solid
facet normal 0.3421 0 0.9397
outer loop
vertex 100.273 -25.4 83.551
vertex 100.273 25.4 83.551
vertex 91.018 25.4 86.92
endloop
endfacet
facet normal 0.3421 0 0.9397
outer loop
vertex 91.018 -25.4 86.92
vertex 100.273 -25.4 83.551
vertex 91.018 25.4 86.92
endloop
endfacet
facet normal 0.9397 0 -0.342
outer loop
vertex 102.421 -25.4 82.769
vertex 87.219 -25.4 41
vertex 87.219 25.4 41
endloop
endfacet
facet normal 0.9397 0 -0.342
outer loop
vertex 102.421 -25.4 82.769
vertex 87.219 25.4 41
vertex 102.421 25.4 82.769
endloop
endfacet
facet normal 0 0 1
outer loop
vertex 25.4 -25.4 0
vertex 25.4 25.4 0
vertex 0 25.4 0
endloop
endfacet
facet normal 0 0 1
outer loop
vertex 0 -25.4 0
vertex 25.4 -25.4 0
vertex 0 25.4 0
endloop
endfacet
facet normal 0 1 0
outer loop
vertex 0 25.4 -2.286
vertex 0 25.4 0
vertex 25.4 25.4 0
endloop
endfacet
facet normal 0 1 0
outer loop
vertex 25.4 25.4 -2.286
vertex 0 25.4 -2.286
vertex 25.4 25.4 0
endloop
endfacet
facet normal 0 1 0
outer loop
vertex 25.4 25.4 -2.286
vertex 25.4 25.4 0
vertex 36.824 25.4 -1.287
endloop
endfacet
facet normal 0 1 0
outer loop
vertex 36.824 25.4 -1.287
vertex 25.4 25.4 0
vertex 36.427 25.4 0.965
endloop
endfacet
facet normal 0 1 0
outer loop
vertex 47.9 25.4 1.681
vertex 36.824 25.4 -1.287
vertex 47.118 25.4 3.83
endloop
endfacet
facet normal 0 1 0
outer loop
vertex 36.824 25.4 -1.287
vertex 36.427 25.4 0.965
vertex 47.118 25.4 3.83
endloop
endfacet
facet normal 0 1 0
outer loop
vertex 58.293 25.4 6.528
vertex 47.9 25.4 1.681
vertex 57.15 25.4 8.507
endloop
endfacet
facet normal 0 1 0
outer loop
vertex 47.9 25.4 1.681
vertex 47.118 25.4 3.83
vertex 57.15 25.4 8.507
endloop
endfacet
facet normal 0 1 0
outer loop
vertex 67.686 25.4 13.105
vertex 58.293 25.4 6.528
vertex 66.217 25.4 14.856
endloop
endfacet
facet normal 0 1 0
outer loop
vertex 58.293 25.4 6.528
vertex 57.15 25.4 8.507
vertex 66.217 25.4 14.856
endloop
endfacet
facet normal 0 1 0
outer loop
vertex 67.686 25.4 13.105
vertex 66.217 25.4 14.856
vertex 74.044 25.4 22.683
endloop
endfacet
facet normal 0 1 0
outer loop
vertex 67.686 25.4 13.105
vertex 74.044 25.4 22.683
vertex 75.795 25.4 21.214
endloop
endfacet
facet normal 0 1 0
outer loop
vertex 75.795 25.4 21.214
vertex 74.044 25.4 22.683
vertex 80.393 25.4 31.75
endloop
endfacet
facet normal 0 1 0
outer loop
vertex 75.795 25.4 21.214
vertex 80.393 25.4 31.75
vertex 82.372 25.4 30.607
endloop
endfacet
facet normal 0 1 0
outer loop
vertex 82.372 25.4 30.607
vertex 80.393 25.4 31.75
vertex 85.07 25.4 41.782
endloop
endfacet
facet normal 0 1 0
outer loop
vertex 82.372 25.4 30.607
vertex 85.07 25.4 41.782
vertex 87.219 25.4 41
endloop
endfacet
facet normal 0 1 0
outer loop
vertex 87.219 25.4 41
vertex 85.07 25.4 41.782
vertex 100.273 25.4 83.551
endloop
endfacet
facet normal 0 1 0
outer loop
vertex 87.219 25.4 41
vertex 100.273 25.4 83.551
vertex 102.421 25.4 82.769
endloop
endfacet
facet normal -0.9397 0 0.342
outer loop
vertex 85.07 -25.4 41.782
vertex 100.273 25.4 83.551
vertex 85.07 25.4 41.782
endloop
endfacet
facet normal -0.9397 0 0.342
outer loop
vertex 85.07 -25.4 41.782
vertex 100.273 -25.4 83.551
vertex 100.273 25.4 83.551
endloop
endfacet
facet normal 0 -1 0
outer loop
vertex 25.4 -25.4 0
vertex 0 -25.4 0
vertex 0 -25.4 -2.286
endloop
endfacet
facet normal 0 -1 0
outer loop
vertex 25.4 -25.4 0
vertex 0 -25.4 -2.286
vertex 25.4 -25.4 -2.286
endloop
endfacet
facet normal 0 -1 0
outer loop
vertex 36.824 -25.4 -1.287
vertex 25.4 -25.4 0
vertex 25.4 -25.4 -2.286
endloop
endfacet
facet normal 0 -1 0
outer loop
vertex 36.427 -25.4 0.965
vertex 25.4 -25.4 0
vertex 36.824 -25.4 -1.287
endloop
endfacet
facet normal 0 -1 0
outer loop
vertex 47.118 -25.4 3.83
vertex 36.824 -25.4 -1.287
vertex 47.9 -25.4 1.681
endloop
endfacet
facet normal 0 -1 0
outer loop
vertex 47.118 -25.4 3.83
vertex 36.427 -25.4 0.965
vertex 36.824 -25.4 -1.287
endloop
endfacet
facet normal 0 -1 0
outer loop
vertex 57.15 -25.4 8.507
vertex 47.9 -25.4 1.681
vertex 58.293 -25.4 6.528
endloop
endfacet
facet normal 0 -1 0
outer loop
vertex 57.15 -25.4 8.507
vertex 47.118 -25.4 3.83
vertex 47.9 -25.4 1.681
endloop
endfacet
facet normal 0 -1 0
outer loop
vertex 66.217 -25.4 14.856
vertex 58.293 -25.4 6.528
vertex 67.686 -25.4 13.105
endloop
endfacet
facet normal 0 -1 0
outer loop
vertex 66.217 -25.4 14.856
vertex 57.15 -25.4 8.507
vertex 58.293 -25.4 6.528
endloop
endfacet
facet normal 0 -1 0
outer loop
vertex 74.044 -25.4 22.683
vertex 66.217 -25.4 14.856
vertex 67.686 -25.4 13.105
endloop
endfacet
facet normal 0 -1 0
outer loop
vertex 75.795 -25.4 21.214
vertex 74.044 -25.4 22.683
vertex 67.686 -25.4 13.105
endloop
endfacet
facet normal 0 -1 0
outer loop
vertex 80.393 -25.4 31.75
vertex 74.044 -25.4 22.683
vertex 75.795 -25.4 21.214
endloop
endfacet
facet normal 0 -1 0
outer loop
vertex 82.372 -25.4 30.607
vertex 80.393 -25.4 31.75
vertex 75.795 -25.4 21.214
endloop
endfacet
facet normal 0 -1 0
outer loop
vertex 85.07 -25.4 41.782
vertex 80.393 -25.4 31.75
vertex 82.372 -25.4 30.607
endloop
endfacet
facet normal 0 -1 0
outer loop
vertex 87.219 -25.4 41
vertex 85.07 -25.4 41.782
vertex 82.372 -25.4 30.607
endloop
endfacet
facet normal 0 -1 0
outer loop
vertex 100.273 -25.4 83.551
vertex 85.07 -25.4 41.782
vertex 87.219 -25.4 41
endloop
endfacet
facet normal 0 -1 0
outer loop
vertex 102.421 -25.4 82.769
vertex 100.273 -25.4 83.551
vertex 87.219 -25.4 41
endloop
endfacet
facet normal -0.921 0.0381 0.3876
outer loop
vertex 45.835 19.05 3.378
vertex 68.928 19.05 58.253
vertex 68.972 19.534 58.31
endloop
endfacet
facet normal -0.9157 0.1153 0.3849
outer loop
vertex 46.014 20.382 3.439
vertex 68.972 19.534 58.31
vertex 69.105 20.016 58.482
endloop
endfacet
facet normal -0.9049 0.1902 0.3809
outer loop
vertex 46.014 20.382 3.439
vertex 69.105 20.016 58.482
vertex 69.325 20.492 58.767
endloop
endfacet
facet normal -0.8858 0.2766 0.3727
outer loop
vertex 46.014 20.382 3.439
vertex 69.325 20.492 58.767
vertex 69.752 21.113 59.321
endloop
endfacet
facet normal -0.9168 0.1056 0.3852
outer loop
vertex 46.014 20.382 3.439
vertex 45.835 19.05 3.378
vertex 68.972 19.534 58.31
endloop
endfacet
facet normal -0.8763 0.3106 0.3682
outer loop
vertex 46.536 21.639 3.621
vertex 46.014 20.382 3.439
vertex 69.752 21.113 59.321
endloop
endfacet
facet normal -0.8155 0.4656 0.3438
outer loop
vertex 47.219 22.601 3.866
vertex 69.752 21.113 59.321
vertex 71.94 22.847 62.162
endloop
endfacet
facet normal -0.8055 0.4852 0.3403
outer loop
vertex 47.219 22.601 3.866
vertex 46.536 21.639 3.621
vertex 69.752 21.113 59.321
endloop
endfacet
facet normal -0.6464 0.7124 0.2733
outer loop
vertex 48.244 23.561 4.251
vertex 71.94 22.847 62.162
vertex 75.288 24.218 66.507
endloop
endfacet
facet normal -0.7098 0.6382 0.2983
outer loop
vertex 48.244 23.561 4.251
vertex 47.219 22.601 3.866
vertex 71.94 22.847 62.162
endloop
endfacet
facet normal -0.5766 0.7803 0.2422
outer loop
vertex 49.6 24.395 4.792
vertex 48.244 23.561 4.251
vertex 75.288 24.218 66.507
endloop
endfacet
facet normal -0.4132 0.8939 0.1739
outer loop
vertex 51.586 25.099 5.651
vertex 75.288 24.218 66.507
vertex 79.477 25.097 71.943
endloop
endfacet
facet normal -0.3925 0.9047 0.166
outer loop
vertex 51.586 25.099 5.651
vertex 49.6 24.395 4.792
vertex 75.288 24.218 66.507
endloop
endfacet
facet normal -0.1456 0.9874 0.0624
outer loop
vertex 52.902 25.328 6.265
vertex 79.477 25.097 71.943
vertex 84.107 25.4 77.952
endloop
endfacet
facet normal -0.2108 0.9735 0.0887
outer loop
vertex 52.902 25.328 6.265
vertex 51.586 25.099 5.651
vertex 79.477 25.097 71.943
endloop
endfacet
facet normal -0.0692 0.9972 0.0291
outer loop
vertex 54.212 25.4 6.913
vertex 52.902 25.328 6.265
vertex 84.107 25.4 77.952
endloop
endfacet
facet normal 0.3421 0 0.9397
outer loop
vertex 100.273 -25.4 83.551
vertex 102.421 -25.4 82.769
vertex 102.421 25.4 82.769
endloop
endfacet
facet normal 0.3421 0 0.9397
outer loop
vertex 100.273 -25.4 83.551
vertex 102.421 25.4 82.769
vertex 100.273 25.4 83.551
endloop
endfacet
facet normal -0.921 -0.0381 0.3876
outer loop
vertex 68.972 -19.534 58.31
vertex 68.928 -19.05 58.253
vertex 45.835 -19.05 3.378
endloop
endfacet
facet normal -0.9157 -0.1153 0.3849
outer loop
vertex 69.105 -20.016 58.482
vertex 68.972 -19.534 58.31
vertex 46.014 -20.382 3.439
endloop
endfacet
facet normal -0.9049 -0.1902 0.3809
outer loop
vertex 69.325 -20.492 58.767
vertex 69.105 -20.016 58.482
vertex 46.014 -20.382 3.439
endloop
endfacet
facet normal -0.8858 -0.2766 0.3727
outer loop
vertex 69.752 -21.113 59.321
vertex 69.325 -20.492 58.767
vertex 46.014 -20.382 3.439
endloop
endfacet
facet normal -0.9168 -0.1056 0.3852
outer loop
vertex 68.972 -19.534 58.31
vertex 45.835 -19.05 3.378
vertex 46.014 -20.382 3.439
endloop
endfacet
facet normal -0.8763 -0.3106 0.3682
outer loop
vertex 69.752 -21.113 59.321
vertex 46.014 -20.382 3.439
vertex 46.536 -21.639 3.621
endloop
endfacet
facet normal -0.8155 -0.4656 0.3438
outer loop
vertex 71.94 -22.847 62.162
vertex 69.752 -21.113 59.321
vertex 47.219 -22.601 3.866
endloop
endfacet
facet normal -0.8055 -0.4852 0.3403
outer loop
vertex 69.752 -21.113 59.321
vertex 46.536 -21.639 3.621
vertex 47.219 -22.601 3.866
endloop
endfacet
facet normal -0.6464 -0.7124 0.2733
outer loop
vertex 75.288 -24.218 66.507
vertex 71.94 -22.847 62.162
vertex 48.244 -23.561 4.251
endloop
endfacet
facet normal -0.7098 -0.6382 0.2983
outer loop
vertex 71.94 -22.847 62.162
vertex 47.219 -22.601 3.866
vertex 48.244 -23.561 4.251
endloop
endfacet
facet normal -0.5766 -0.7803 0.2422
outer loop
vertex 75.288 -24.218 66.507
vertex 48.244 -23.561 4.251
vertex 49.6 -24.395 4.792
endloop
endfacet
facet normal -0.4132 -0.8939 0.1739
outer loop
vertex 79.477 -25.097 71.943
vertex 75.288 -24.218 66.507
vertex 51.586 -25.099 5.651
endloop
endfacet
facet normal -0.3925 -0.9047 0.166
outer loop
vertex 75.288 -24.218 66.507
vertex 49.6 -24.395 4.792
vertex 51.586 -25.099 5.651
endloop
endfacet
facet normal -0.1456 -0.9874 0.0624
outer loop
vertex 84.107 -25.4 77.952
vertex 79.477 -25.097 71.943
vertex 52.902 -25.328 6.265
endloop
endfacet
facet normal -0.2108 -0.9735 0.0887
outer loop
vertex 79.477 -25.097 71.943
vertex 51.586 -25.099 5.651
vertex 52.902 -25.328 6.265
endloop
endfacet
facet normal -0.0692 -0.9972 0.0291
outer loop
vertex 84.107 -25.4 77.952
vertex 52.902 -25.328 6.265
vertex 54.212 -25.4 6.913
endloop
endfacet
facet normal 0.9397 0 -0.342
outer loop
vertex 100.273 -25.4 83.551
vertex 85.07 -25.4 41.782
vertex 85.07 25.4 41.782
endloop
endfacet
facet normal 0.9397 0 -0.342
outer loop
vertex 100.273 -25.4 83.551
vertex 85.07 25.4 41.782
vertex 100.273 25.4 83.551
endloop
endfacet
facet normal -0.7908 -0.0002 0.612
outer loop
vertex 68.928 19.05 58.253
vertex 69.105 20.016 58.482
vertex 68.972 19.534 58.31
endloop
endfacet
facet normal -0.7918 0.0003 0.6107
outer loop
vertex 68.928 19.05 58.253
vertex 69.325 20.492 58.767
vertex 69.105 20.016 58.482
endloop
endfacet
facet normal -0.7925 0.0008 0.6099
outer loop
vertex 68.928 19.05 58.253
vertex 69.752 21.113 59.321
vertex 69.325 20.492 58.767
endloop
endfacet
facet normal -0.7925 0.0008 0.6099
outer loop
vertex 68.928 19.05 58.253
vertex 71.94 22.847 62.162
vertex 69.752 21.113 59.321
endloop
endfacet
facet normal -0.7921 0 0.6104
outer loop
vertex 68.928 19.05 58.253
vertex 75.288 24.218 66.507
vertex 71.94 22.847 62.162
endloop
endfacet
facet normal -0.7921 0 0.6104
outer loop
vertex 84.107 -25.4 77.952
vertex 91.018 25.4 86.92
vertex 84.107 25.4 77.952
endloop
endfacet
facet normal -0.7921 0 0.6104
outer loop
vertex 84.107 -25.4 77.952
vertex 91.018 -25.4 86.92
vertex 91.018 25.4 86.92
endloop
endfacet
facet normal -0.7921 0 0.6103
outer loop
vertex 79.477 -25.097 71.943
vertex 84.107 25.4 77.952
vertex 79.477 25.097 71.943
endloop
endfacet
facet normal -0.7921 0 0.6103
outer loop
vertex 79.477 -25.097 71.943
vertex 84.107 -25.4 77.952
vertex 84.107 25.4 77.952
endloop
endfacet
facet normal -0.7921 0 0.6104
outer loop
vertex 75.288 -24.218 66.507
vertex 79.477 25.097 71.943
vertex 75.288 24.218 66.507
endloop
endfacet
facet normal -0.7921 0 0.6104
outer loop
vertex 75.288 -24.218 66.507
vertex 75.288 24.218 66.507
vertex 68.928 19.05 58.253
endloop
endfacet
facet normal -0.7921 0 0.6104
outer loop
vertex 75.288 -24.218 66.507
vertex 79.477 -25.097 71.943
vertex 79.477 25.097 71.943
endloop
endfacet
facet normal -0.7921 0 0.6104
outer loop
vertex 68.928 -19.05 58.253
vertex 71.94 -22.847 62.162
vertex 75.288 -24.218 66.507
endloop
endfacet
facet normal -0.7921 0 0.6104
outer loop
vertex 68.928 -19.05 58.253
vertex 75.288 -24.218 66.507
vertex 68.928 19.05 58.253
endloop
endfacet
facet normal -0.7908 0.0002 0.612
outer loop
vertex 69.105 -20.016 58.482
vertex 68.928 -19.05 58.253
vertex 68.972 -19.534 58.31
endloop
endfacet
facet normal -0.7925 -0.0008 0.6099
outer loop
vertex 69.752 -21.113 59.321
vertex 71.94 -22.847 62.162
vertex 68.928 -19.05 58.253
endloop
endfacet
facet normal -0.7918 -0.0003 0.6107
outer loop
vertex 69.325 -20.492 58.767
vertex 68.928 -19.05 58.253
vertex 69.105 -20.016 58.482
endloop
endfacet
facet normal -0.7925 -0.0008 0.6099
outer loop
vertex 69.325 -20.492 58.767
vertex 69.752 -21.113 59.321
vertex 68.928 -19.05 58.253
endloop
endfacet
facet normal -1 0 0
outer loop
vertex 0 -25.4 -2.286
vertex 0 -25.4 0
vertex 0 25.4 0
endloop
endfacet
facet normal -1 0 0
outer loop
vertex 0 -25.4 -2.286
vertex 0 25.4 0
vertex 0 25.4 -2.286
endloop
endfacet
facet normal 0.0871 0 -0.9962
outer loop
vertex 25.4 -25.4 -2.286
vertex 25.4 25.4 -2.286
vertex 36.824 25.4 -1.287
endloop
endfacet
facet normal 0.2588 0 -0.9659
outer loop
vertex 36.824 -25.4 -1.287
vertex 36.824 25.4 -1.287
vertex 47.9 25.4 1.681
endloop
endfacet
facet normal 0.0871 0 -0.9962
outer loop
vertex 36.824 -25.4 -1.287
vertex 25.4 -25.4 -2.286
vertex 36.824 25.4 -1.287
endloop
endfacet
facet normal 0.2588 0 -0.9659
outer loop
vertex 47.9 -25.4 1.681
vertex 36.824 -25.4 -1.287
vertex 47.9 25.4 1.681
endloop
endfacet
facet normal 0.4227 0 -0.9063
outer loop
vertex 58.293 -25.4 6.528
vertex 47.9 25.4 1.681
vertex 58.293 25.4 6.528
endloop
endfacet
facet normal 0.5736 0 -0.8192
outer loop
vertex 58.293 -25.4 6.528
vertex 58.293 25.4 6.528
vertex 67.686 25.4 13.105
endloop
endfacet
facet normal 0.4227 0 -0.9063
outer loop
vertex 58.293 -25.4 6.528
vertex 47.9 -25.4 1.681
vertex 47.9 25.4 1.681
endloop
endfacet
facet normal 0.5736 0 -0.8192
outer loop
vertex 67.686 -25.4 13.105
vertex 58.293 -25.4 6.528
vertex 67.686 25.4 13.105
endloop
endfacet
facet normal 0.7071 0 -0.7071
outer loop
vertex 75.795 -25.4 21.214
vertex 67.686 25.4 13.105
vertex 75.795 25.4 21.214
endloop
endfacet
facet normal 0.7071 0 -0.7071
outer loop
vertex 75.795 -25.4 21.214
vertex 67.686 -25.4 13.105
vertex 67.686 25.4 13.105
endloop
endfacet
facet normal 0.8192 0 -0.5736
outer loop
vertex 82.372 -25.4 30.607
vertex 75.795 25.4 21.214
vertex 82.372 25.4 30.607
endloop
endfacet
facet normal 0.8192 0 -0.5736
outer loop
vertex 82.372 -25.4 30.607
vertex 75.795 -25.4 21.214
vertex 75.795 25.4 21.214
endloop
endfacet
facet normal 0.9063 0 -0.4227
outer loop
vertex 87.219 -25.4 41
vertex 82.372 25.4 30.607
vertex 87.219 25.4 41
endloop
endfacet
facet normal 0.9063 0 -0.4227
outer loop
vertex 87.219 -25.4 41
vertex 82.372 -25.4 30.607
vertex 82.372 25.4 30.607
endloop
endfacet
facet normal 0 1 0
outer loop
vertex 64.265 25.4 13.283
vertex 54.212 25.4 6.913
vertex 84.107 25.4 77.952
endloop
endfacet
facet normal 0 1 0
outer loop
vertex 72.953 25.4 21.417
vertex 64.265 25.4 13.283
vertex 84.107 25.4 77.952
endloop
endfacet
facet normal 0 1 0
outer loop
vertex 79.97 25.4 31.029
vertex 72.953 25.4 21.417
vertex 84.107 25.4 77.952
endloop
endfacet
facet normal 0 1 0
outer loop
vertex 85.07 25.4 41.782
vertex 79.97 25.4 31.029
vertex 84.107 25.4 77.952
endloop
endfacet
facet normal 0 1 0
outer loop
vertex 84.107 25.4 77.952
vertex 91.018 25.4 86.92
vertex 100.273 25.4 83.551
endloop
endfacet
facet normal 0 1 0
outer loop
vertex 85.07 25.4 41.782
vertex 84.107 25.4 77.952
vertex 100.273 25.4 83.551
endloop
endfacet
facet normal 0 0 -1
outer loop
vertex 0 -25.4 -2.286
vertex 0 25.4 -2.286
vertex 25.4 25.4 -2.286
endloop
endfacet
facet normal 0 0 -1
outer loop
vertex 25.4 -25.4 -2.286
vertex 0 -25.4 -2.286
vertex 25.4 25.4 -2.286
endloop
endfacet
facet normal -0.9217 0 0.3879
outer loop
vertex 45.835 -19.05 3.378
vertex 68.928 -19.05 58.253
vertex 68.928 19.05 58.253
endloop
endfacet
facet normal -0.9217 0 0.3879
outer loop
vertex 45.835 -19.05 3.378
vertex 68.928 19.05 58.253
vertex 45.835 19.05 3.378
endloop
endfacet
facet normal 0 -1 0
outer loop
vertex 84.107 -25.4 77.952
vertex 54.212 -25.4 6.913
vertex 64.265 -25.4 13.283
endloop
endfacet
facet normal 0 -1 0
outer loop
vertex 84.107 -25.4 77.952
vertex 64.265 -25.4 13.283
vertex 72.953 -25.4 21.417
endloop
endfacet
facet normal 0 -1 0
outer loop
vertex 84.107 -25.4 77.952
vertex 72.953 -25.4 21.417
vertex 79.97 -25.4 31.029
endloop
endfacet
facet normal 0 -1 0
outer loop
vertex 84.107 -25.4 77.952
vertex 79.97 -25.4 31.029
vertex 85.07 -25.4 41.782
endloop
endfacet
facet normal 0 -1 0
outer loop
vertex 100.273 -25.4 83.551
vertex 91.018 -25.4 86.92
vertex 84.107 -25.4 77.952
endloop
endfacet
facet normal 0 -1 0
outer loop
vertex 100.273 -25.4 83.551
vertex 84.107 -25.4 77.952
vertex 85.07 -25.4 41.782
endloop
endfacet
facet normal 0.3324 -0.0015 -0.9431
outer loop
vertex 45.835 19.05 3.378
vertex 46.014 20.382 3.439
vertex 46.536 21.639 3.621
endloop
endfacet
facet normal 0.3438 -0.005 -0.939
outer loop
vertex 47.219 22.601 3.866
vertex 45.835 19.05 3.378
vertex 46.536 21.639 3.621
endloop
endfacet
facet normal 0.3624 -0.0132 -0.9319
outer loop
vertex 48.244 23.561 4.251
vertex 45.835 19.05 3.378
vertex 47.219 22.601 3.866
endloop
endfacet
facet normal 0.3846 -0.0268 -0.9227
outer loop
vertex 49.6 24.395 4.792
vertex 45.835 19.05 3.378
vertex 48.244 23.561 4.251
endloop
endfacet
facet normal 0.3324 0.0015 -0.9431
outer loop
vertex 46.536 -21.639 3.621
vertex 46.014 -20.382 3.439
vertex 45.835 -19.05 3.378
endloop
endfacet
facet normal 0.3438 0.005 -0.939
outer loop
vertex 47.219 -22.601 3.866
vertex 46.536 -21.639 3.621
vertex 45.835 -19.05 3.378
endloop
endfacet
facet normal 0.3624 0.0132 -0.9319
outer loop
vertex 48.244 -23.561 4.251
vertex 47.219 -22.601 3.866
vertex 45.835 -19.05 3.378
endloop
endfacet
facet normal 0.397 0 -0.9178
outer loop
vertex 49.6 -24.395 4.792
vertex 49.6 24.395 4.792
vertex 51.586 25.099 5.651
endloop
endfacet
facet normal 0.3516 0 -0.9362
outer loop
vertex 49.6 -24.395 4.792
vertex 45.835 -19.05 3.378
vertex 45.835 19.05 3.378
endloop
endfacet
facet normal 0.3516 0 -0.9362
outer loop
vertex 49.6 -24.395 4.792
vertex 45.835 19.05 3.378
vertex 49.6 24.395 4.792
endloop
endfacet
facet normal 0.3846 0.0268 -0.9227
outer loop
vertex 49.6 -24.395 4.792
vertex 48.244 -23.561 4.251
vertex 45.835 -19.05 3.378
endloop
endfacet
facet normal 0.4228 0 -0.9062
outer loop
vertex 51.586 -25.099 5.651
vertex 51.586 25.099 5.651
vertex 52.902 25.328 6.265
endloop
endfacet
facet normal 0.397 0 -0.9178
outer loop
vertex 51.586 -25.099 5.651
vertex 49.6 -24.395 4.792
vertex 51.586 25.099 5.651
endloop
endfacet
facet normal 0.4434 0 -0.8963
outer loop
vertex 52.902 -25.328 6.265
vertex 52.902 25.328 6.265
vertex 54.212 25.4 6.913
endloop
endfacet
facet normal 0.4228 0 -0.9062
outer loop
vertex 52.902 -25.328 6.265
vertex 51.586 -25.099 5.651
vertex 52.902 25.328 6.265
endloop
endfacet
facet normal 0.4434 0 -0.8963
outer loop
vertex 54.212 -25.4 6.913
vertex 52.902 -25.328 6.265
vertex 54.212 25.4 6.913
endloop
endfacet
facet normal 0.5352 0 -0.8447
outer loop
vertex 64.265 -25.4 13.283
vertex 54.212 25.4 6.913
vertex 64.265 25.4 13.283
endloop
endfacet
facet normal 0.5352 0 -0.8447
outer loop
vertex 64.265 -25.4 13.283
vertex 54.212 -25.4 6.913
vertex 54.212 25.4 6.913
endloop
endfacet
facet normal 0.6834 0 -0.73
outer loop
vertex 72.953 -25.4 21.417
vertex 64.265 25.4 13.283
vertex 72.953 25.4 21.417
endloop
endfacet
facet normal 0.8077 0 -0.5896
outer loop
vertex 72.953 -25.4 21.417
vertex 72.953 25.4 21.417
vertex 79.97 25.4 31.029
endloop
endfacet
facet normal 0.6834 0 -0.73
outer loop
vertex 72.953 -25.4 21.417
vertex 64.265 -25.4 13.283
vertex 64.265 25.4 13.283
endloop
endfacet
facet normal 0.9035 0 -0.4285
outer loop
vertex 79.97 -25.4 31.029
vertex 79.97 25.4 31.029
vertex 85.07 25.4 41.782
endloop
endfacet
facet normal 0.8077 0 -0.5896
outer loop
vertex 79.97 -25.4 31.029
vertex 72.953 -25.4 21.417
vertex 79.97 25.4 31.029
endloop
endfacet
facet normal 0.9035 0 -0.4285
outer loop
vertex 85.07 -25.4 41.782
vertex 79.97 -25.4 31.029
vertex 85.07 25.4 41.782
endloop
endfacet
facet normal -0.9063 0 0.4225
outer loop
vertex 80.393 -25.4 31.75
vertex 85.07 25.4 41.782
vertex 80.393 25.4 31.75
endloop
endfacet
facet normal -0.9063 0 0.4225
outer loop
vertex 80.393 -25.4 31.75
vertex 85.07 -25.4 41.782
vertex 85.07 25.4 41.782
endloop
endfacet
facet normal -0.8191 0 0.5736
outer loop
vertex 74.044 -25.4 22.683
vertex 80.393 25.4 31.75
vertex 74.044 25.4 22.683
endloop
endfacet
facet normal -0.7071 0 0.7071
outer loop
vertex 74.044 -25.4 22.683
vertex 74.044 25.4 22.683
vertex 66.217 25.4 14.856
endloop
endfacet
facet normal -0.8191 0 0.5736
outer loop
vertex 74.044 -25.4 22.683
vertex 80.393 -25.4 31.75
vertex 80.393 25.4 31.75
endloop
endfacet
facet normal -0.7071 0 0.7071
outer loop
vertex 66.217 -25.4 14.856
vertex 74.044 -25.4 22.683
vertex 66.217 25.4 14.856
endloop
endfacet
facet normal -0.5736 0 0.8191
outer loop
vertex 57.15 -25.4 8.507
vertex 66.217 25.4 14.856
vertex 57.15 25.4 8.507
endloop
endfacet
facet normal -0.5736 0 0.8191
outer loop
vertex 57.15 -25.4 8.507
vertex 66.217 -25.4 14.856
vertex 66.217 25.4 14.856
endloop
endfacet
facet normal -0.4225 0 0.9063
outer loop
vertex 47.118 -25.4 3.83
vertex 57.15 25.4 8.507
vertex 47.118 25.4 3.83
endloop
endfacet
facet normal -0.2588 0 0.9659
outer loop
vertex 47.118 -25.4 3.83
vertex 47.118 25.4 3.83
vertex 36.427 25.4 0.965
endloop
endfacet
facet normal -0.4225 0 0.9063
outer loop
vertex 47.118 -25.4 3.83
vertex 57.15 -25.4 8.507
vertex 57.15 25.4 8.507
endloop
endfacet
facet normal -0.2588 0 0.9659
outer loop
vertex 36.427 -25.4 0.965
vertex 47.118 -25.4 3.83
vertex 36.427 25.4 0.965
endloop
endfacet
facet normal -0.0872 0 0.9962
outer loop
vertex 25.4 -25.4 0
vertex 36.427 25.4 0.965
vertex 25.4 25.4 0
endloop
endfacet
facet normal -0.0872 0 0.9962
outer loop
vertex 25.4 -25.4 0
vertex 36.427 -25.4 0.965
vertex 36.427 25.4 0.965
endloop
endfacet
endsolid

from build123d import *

# Parameters (mm, degrees)
F1_DEPTH      = 25.4
F3_DEPTH      = 25.4
F3_DEPTH_BACK = 25.4
F4_R          = 6.35


with BuildPart() as f1:
    # F0 (on Front) → F1 (new body, symmetric)
    with BuildSketch(Plane.XZ):
        with BuildLine():
            Line((25.4, 0), (0, 0))
            Line((0, 0), (0, -2.286))
            Line((0, -2.286), (25.4, -2.286))
            ThreePointArc((25.4, -2.286), (63.133299, 9.611264), (87.218619, 40.999863))
            Line((87.218619, 40.999863), (102.421414, 82.7692))
            Line((102.421414, 82.7692), (100.273277, 83.551058))
            Line((100.273277, 83.551058), (85.070481, 41.781721))
            ThreePointArc((85.070481, 41.781721), (61.822104, 11.483845), (25.4, 0))
        make_face()
    extrude(amount=F1_DEPTH, both=True)


with BuildPart() as f3:
    # F2 (on Front) → F3 (new body, two sides)
    with BuildSketch(Plane.XZ) as f3_sk:
        with BuildLine():
            ThreePointArc((45.83549, 3.378117), (69.817911, 18.120498), (85.070481, 41.781721))
            Line((85.070481, 41.781721), (100.273277, 83.551058))
            Line((100.273277, 83.551058), (91.017869, 86.919751))
            Line((91.017869, 86.919751), (68.928234, 58.252834))
            Line((68.928234, 58.252834), (45.83549, 3.378117))
        make_face()
    extrude(amount=F3_DEPTH)
    extrude(f3_sk.sketch, amount=-F3_DEPTH_BACK)

    # F4
    f4_edges = [f3.edges().sort_by_distance(p)[0] for p in [
        (57.381862, -25.4, 30.815476),
        (57.381862, 25.4, 30.815476),
    ]]
    fillet(f4_edges, radius=F4_R)


solid = Compound([f1.part, f3.part])
